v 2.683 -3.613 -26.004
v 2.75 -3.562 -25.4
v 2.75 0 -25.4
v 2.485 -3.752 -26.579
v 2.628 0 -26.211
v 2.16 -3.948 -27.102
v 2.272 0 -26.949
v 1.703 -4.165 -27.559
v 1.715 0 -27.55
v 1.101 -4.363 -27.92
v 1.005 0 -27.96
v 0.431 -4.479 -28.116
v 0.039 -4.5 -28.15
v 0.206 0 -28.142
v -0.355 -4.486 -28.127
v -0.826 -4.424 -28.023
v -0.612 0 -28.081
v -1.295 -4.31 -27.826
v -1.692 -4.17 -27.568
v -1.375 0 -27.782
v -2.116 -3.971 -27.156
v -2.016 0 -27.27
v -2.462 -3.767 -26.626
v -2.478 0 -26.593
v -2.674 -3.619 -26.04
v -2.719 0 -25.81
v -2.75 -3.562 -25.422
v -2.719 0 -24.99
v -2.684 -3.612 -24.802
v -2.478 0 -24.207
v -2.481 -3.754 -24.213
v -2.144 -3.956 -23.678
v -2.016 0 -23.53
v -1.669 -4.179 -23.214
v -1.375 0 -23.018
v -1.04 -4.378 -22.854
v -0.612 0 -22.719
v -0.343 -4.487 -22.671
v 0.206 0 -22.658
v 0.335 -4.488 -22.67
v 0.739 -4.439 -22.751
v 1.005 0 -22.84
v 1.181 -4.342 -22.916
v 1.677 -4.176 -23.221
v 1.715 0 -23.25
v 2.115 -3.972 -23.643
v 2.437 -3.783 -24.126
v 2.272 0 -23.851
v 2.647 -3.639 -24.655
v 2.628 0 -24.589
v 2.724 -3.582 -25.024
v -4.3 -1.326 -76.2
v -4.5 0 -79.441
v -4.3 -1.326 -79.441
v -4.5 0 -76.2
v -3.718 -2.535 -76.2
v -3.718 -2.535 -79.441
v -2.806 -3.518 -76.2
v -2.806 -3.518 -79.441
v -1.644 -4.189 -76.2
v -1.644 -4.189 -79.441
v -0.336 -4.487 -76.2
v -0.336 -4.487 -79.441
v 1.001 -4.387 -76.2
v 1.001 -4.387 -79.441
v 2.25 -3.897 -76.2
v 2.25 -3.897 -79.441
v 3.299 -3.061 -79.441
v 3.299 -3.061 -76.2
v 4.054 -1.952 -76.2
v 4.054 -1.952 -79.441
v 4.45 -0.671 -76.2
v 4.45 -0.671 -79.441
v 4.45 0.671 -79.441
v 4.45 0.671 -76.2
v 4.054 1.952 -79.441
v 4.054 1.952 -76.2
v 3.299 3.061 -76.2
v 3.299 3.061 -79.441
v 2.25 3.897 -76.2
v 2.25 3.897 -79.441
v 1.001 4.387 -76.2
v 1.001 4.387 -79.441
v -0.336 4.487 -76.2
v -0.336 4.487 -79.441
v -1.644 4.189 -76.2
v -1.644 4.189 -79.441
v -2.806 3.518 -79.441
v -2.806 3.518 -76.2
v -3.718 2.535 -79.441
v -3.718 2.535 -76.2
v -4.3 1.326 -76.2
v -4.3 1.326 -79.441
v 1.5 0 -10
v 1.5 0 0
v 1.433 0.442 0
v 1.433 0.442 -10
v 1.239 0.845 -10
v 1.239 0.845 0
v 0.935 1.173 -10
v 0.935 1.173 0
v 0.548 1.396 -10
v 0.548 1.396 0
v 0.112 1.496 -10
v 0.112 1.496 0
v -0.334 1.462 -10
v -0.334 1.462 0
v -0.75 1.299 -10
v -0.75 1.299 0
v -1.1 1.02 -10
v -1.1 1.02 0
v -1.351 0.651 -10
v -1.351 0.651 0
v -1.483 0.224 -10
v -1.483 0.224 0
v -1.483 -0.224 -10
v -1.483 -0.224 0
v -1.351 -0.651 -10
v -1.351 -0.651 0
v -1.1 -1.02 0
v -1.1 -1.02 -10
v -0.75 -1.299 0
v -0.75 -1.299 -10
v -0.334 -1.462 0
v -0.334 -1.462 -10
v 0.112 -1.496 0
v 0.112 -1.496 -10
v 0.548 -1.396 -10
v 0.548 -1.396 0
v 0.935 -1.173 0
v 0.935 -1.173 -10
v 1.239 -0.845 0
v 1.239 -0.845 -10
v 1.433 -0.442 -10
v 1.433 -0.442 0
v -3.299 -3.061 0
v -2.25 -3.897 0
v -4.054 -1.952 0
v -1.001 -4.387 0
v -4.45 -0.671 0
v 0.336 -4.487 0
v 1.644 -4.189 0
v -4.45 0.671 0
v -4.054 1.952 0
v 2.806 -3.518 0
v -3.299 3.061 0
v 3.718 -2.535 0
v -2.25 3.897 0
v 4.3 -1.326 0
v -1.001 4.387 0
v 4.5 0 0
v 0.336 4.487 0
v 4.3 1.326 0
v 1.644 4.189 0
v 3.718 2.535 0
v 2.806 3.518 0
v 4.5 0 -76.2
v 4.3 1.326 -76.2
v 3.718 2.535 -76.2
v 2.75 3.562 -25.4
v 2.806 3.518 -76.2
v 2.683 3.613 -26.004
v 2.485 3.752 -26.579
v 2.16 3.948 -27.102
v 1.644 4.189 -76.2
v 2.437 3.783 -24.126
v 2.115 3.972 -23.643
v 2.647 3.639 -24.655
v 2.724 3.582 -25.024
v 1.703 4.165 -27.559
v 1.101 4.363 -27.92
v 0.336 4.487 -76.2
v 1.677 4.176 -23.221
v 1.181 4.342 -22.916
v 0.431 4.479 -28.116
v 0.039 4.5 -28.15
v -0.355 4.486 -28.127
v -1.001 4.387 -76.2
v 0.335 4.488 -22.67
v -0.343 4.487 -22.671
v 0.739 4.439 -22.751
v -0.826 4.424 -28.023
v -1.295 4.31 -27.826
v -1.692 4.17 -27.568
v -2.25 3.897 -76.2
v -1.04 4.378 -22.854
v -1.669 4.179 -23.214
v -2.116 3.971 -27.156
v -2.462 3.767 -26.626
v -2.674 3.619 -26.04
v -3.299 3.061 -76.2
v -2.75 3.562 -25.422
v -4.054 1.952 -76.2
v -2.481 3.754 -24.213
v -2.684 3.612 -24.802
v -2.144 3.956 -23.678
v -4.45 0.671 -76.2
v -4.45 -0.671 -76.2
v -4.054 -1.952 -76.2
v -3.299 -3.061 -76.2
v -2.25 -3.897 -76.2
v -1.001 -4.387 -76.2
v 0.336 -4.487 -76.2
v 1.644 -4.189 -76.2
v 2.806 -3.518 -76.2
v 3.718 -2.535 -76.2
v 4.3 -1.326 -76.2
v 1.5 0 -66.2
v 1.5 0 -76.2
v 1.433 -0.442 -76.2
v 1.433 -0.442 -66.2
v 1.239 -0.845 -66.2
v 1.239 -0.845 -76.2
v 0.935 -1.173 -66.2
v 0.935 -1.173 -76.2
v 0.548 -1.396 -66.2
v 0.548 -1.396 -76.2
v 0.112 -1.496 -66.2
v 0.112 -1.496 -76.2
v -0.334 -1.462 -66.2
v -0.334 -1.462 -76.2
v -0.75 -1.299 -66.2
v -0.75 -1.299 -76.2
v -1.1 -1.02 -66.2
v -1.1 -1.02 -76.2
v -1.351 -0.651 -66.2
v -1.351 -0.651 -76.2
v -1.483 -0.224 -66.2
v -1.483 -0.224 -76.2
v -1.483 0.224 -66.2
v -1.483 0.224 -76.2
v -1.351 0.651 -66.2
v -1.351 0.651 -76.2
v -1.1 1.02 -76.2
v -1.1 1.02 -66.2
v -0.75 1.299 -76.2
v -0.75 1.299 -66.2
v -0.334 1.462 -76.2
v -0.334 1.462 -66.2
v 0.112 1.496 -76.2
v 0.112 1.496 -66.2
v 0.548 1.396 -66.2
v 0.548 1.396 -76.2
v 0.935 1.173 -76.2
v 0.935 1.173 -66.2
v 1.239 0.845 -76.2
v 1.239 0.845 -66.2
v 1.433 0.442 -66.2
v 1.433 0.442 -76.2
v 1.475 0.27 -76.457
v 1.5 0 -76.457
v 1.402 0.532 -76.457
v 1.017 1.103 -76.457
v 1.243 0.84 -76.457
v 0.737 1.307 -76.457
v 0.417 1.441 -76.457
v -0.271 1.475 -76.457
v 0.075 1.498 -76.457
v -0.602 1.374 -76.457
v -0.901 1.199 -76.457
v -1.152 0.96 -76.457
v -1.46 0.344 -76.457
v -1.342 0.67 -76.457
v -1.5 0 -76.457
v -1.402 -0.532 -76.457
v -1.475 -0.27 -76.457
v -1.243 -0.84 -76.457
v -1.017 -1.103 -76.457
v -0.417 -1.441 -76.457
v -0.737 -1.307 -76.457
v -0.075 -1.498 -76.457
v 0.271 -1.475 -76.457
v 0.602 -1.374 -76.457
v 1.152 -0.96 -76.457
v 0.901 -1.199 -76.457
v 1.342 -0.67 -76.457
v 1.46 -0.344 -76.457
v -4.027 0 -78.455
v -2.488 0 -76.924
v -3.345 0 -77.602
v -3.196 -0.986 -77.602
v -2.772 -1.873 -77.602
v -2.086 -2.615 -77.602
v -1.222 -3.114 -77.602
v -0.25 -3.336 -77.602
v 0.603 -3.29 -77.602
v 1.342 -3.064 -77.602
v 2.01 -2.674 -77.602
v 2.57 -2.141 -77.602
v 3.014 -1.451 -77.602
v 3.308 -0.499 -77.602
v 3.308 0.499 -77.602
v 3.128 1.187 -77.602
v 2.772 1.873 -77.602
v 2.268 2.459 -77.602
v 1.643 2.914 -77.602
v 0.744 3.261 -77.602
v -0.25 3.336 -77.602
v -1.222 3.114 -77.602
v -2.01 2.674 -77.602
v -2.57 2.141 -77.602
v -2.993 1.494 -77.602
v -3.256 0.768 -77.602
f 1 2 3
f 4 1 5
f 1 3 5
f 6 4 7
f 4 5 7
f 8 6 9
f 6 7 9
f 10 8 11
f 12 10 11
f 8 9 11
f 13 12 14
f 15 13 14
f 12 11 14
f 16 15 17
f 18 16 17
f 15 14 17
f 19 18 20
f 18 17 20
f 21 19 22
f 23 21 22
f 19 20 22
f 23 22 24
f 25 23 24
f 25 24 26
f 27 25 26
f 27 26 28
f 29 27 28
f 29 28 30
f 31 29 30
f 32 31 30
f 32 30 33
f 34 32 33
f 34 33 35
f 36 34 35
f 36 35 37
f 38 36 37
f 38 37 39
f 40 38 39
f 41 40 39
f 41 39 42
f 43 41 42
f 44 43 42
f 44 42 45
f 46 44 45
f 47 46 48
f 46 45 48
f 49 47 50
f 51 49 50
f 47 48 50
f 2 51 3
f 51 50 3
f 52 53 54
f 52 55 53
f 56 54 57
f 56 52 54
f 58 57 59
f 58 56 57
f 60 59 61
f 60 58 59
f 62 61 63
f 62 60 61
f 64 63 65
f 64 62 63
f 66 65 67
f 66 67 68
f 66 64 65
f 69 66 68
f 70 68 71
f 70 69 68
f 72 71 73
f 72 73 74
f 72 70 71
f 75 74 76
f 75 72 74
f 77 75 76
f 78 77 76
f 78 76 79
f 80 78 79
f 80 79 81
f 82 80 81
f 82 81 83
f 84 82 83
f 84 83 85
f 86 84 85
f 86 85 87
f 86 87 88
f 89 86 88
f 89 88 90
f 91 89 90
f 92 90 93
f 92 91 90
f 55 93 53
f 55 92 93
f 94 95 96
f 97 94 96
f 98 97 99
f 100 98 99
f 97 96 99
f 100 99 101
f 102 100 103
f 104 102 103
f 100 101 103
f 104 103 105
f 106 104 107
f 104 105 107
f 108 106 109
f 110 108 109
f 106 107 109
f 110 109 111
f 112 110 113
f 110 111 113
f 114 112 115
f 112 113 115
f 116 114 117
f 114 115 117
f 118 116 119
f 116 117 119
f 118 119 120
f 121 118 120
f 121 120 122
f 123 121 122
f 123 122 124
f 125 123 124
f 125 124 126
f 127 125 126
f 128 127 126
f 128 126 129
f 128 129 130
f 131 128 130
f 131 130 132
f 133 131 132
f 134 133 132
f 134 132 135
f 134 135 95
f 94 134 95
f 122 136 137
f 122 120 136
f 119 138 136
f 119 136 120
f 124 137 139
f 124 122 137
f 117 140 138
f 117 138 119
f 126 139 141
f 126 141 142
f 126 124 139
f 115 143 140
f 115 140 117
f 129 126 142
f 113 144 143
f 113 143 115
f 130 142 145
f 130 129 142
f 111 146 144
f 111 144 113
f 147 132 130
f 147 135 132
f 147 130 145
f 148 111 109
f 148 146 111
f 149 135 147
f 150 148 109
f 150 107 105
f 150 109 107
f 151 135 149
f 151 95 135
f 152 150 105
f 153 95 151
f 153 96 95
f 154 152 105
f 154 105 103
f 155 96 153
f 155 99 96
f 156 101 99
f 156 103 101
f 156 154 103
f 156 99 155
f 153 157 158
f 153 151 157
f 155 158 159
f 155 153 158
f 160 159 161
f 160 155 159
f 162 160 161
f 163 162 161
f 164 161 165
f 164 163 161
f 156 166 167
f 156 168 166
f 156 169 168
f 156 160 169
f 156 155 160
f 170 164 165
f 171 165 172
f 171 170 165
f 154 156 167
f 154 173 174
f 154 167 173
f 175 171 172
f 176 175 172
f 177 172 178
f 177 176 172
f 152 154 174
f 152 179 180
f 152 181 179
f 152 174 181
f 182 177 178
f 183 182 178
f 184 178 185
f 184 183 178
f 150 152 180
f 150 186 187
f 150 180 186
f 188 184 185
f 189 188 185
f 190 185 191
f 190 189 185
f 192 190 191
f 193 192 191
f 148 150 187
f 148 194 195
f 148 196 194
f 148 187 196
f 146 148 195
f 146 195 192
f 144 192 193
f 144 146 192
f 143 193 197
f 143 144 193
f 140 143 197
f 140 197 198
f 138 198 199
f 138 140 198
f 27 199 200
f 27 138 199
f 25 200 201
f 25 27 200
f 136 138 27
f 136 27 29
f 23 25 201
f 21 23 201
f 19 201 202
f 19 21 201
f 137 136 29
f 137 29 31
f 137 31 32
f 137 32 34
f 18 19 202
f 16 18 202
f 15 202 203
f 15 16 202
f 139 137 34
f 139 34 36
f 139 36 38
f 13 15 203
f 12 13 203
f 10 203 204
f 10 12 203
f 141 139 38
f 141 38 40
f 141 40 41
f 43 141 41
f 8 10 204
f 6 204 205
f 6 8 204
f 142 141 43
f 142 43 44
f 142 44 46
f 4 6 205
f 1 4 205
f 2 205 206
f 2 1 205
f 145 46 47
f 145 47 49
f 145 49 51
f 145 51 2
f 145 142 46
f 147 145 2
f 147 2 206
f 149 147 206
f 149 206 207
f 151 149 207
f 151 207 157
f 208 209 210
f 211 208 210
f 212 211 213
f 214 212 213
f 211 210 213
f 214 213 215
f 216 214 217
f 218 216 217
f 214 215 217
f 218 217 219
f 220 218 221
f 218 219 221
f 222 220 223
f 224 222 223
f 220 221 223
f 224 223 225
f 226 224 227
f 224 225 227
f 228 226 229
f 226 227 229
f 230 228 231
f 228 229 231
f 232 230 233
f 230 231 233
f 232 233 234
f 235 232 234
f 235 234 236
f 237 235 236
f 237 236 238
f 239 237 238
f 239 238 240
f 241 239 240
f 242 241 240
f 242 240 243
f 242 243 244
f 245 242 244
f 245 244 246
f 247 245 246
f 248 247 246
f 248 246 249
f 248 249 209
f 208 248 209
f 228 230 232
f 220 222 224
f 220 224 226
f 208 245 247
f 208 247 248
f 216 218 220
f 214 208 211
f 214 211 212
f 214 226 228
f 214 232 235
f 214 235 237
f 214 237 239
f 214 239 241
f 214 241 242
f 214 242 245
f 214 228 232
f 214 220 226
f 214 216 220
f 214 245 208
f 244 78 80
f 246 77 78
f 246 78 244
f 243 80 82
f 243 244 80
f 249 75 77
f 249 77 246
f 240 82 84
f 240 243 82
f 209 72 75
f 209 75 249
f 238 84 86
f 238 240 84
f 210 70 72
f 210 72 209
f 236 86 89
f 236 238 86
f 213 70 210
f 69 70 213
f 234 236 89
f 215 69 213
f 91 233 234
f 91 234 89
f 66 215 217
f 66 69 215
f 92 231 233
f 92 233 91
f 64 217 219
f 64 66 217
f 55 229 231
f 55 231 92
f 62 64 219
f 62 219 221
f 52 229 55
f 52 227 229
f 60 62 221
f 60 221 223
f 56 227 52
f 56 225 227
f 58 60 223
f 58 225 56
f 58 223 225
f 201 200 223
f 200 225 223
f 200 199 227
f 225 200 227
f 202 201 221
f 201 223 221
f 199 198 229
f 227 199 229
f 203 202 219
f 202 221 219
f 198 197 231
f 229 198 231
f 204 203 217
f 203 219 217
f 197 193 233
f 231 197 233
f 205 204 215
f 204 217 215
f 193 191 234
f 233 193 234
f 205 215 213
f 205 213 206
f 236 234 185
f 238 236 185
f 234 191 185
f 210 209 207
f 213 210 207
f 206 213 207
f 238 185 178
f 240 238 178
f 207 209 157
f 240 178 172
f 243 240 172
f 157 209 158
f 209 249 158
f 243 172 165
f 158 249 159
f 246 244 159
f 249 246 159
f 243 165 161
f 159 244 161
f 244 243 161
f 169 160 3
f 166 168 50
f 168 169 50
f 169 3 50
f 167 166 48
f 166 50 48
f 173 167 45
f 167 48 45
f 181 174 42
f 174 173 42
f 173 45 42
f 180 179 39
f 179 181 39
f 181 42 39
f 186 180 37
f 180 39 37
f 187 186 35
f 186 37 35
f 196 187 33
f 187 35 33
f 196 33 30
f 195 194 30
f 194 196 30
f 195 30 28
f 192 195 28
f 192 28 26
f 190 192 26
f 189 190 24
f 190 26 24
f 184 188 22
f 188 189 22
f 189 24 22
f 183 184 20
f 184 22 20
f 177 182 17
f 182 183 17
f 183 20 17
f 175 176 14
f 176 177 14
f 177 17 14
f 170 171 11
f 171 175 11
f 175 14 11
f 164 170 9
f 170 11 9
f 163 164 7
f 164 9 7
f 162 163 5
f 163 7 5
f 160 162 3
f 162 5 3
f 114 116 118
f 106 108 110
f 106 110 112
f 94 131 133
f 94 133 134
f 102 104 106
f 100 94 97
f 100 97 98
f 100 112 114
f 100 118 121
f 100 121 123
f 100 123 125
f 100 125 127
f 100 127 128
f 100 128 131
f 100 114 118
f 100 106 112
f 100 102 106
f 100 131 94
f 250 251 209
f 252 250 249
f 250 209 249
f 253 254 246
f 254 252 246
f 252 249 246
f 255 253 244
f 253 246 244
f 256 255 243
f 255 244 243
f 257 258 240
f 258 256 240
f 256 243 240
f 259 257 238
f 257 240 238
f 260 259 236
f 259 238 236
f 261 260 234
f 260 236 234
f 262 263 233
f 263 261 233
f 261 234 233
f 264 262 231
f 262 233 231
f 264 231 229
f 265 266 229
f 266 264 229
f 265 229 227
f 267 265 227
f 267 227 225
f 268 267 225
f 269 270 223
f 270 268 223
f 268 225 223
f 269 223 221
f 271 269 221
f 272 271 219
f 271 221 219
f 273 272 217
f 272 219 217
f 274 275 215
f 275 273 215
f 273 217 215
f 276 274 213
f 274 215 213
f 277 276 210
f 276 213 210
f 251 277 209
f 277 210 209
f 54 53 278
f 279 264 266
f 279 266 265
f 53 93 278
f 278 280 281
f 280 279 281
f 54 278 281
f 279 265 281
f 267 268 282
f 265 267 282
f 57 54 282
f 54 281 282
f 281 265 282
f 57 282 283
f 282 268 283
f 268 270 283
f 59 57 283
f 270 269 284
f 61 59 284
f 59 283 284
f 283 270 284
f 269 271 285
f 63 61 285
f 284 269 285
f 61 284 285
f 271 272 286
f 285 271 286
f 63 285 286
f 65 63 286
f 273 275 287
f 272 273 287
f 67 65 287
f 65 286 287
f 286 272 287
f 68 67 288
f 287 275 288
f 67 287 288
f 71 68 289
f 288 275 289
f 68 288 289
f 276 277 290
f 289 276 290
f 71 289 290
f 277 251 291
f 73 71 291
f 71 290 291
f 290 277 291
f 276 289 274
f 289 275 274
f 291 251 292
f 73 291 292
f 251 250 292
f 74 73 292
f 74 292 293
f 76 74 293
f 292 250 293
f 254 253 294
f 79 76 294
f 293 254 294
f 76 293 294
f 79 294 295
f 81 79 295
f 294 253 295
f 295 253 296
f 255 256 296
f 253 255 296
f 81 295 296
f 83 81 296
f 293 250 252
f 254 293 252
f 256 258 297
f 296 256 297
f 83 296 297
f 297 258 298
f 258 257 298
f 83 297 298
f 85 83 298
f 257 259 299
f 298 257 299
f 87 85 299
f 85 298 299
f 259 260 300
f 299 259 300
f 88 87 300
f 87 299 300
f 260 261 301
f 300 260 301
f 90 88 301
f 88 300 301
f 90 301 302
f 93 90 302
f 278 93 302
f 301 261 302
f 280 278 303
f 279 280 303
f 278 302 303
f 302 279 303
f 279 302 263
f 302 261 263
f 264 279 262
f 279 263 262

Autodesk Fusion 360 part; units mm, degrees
sketch "Sketch1" plane through (0, 0, 0) normal (0, 0, 1) x (1, 0, 0)
  circle A0 centre (0, 0) radius 4.5
  circle A1 centre (0, 0) radius 1.5
  dimension "d1" = 9
  dimension "d2" = 3
extrude "Extrude1" add sketch "Sketch1" against normal blind 76.2 contours A0 | A1 makes body 1
extrude "Extrude2" cut sketch "Sketch1" against normal blind 10 contours A1 bodies 1
sketch "Sketch2" plane through (0, 0, -76.2) normal (0, 0, -1) x (1, 0, 0)
  circle A0 centre (0, 0) radius 4.5
  circle A1 centre (0, 0) radius 1.5
extrude "Extrude3" cut sketch "Sketch2" along normal blind -10 and the other way blind -5 contours A1 bodies 1
ref_plane "WorkPlane1" through (0, 0, 0) normal (0, 1, 0) x (0, 0, 1)
sketch "Sketch3" plane through (0, 0, 0) normal (0, 1, 0) x (1, 0, 0)
  line L0 (4.5, 76.2) -> (-4.5, 76.2)
  line L1 (-4.5, 0) -> (4.5, 0)
  circle A0 centre (0, 25.4) radius 2.75
  line L2 (-4.5, 0) -> (4.5, 0)
  circle A1 centre (0, 81) radius 4.7625
  line L3 (-4.5, 79.4407) -> (-4.5, 76.2)
  arc A2 (-4.5, 79.4407) -> (0, 76.2) centre (0.0531, 81.0184) ccw
  dimension "d10" = 5.5
  dimension "d13" = 25.4
  dimension "d14" = 9.525
extrude "Extrude4" cut sketch "Sketch3" along normal through all and the other way through all contours A0 bodies 1
revolve "Revolve1" add sketch "Sketch3" angle 360 about axis through (0, 0, 1.75) along (0, 0, 1) separate body contours L0 L3 A2 makes body 2
extrude "Extrude5" cut sketch "Sketch2" along normal blind 5 contours A1 bodies 2
equation "d3 = -25.4 * 3 mm"
equation "d14 = ( ( 3 / 8 ) * 25.4 ) * 1 mm"
